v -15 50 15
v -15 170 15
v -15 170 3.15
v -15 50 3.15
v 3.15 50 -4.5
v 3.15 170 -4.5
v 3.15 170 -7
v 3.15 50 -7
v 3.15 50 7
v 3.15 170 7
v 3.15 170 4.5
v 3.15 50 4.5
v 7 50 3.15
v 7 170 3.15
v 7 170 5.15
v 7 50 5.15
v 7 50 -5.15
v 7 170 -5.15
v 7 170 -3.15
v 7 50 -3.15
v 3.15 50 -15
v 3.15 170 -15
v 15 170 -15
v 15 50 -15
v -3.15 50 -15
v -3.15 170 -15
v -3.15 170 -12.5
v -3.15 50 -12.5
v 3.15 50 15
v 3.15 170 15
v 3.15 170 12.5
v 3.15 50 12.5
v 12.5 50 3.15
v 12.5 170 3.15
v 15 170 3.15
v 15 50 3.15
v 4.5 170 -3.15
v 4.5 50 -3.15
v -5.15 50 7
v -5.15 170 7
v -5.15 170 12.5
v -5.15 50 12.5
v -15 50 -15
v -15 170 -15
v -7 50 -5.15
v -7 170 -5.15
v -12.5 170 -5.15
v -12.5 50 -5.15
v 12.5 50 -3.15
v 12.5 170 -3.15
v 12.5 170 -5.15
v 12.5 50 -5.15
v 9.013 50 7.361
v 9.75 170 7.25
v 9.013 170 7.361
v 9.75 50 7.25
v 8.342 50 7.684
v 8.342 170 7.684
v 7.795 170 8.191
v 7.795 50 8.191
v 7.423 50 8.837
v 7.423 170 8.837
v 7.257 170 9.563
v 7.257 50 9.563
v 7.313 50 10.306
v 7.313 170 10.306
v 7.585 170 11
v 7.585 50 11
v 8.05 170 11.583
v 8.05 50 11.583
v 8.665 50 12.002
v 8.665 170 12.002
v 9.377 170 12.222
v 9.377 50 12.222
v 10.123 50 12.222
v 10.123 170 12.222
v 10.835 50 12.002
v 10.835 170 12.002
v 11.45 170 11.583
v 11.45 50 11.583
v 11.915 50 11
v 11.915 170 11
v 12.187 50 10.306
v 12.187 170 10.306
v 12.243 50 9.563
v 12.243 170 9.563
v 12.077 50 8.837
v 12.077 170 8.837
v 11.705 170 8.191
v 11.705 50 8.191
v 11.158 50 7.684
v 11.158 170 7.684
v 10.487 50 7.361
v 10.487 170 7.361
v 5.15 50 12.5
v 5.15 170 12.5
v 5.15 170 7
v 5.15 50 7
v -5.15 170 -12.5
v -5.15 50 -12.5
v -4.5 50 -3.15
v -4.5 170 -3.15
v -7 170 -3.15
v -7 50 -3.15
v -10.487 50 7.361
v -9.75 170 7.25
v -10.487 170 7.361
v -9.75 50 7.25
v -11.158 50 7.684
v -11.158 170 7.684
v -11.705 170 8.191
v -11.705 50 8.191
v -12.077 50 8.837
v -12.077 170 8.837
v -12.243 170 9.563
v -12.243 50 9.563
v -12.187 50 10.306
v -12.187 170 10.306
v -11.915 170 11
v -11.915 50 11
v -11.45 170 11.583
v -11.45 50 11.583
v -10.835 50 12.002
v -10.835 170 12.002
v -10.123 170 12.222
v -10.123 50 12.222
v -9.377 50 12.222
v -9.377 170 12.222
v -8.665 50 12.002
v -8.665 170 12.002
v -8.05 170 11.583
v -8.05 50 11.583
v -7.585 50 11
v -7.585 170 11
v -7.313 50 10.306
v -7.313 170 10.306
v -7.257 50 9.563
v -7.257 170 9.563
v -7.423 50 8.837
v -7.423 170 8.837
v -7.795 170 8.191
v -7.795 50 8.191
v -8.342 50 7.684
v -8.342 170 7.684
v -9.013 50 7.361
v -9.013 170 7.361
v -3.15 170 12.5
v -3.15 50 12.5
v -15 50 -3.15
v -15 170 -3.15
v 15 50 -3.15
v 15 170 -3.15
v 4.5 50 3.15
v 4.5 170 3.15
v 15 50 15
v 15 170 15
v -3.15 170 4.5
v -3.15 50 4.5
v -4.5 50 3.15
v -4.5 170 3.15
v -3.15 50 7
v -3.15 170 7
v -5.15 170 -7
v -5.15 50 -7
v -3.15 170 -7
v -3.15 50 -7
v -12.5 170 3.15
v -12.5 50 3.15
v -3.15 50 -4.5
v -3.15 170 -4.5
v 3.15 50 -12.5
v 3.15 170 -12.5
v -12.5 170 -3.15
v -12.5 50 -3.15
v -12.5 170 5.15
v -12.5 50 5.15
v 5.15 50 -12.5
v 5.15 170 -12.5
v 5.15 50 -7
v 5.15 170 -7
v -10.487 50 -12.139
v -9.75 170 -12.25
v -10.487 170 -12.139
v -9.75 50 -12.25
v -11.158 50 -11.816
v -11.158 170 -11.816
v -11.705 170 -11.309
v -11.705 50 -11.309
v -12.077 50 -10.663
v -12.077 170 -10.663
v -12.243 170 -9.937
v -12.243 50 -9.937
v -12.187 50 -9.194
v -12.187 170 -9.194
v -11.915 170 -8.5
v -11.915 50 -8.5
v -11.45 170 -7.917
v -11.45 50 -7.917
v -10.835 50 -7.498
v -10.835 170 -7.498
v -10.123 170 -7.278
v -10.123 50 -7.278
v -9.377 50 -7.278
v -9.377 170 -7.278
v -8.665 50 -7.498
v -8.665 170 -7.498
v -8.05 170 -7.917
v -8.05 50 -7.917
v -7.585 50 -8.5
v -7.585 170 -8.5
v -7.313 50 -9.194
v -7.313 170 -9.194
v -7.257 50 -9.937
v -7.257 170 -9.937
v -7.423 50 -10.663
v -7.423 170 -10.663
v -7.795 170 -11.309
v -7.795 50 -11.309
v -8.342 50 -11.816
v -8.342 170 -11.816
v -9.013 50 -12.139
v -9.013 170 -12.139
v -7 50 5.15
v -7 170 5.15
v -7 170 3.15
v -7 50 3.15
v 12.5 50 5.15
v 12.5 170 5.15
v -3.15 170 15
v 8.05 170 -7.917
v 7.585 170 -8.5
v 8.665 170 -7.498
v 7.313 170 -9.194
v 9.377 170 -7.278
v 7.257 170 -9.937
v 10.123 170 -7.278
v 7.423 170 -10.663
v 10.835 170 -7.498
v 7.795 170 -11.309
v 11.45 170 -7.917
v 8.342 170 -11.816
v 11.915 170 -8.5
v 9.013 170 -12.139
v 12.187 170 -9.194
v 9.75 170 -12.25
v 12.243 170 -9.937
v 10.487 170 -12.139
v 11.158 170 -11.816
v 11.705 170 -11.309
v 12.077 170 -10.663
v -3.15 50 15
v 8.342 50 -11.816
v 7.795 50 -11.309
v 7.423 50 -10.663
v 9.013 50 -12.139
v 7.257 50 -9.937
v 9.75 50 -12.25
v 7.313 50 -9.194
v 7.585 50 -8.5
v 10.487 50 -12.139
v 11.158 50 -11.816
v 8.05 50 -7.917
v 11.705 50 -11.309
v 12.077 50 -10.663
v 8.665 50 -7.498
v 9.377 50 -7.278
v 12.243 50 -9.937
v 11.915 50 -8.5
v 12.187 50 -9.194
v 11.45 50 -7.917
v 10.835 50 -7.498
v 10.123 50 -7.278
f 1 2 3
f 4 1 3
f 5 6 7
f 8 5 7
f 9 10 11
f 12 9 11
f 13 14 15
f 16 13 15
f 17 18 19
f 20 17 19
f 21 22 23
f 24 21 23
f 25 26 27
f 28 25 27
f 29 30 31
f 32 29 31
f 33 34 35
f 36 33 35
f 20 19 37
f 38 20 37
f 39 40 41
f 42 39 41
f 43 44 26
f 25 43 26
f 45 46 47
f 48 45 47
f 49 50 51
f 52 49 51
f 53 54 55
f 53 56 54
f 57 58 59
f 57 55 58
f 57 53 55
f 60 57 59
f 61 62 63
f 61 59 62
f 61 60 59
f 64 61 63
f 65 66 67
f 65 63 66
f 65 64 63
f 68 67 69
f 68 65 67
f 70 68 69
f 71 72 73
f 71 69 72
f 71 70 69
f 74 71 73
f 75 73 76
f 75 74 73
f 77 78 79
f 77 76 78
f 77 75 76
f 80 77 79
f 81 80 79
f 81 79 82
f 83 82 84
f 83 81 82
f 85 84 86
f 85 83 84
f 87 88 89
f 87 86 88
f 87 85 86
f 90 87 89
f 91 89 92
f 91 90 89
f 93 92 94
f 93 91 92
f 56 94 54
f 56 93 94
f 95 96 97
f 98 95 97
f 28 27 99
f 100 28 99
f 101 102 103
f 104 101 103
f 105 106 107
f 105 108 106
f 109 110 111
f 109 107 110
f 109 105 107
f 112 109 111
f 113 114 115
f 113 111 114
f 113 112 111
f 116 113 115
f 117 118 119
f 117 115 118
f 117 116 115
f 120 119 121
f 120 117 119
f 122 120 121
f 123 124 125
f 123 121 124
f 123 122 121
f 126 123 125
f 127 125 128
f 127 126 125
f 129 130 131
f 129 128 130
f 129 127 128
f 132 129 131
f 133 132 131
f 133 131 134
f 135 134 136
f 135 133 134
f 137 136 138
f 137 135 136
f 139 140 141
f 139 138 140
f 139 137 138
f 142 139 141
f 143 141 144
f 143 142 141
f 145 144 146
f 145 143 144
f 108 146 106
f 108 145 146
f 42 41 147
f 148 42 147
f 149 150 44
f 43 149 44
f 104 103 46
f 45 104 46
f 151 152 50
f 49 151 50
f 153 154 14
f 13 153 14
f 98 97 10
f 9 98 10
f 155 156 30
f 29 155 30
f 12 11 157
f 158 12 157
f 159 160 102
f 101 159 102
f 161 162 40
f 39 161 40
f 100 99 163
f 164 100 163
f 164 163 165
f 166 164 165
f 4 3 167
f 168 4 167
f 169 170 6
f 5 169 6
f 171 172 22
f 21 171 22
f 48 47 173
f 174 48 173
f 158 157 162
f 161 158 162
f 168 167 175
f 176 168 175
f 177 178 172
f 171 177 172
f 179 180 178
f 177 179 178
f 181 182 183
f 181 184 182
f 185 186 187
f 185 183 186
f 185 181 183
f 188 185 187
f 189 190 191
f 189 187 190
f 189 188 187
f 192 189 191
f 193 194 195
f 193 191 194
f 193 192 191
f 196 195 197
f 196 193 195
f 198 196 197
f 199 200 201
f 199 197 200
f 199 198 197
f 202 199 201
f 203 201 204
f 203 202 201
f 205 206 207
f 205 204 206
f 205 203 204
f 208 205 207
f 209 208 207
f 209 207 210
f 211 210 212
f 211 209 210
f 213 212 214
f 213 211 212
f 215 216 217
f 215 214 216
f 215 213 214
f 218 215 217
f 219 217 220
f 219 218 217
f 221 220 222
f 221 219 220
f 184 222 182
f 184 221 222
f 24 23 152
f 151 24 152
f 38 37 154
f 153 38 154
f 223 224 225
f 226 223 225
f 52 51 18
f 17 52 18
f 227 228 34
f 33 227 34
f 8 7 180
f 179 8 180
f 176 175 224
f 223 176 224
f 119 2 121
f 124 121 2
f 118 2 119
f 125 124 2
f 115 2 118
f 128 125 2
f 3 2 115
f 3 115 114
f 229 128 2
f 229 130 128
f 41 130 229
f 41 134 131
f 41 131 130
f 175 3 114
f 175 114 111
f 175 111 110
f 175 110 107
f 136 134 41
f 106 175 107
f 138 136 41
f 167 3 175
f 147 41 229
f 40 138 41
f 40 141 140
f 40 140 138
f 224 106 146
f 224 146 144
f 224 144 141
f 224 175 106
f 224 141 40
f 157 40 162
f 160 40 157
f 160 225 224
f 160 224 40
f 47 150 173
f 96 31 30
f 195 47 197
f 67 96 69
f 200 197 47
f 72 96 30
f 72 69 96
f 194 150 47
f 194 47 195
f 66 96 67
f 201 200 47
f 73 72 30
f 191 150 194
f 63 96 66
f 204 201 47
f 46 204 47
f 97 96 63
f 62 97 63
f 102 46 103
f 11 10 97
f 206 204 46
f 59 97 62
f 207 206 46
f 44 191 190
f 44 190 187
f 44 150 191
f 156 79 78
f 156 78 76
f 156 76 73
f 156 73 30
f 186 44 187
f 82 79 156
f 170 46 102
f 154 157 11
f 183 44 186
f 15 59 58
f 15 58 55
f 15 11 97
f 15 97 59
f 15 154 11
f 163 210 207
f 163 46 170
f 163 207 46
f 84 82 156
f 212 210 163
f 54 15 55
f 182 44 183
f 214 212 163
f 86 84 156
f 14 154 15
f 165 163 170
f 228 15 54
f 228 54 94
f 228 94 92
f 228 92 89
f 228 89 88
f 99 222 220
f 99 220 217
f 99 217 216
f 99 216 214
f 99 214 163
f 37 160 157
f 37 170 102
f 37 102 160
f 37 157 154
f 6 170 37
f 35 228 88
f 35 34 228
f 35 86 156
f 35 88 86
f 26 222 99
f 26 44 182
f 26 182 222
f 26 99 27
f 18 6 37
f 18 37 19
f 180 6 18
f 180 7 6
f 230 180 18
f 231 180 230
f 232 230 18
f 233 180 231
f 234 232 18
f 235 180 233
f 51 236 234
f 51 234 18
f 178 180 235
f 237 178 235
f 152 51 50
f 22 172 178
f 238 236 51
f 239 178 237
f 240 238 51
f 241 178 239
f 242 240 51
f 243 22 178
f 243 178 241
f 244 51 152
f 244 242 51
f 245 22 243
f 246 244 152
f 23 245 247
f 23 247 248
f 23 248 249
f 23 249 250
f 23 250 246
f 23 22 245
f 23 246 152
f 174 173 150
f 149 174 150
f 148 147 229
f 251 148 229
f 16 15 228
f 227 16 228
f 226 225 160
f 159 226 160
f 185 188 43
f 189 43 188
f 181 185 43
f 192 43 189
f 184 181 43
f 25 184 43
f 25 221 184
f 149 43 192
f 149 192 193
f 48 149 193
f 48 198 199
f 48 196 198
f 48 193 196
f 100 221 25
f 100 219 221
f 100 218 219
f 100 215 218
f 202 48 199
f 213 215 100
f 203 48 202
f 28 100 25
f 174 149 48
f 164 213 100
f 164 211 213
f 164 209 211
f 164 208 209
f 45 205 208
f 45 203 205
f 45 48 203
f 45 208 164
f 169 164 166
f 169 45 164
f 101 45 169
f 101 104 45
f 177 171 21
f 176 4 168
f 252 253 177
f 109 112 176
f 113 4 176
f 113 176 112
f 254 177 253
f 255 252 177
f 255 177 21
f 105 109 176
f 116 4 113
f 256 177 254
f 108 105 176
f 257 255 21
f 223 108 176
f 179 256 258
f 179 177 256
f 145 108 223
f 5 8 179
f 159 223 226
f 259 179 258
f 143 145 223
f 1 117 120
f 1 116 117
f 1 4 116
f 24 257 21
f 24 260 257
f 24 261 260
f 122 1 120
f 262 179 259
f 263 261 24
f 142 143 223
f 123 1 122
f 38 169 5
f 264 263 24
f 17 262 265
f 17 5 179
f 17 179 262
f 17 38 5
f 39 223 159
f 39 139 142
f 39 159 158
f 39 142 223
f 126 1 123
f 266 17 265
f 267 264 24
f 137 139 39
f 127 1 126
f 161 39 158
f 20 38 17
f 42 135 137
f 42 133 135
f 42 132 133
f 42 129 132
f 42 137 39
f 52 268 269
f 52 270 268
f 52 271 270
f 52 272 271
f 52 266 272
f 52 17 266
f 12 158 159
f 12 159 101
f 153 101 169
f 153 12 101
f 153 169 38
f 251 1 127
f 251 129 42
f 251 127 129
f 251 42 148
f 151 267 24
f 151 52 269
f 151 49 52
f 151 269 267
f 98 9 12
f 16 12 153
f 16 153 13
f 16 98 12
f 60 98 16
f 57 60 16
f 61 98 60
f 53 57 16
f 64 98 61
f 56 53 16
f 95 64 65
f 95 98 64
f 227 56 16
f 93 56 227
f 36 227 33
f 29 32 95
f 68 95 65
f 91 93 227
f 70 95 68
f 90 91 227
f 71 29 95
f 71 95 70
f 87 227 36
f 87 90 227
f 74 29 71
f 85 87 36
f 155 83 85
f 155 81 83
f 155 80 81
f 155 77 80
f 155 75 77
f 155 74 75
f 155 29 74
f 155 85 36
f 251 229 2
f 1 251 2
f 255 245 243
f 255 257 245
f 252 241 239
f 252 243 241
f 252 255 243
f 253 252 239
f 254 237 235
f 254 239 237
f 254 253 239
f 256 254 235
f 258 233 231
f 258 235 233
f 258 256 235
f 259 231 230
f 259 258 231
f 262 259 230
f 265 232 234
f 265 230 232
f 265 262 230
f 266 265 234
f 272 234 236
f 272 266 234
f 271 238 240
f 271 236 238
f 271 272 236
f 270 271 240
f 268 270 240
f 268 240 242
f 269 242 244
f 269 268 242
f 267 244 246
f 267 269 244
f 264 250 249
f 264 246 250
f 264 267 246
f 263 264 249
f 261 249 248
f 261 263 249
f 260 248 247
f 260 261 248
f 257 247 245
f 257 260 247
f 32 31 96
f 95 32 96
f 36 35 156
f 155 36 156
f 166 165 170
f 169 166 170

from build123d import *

# Parameters (mm, degrees)
SKETCH_1_R          = 2.5
EXTRUDE_1_DEPTH     = 180
SKETCH_2_R          = 82.250528809
CUT_EXTRUDE_1_DEPTH = 10
SKETCH_3_R          = 47.359827943
CUT_EXTRUDE_2_DEPTH = 200
SKETCH_4_R          = 50.055938799
CUT_EXTRUDE_3_DEPTH = 30


with BuildPart() as part:
    # 草图1 → 凸台-拉伸1 (new, symmetric)
    with BuildSketch(Plane(origin=(0, 0, 0), x_dir=(1, 0, 0), z_dir=(0, 1, 0))):
        Polygon((-15, -3.15), (-12.5, -3.15), (-12.5, -5.15), (-7, -5.15), (-7, -3.15), (-4.5, -3.15), (-4.5, 3.15), (-7, 3.15), (-7, 5.15), (-12.5, 5.15), (-12.5, 3.15), (-15, 3.15), (-15, 15), (-3.15, 15), (-3.15, 12.5), (-5.15, 12.5), (-5.15, 7), (-3.15, 7), (-3.15, 4.5), (3.15, 4.5), (3.15, 7), (5.15, 7), (5.15, 12.5), (3.15, 12.5), (3.15, 15), (15, 15), (15, 3.15), (12.5, 3.15), (12.5, 5.15), (7, 5.15), (7, 3.15), (4.5, 3.15), (4.5, -3.15), (7, -3.15), (7, -5.15), (12.5, -5.15), (12.5, -3.15), (15, -3.15), (15, -15), (3.15, -15), (3.15, -12.5), (5.15, -12.5), (5.15, -7), (3.15, -7), (3.15, -4.5), (-3.15, -4.5), (-3.15, -7), (-5.15, -7), (-5.15, -12.5), (-3.15, -12.5), (-3.15, -15), (-15, -15), align=None)
        with Locations(Location((-9.75, -9.75, 0), (0, 0, 90))):
            Circle(SKETCH_1_R, mode=Mode.SUBTRACT)
        with Locations(Location((-9.75, 9.75, 0), (0, 0, 90))):
            Circle(SKETCH_1_R, mode=Mode.SUBTRACT)
        with Locations(Location((9.75, 9.75, 0), (0, 0, 90))):
            Circle(SKETCH_1_R, mode=Mode.SUBTRACT)
        with Locations(Location((9.75, -9.75, 0), (0, 0, 90))):
            Circle(SKETCH_1_R, mode=Mode.SUBTRACT)
    extrude(amount=EXTRUDE_1_DEPTH, both=True)

    # 草图2 → 切除-拉伸1 (cut)
    with BuildSketch(Plane(origin=(0, 180, 0), x_dir=(1, 0, 0), z_dir=(0, 1, 0))):
        Circle(SKETCH_2_R)
    extrude(amount=-CUT_EXTRUDE_1_DEPTH, mode=Mode.SUBTRACT)

    # 草图3 → 切除-拉伸2 (cut)
    with BuildSketch(Plane.XZ.offset(180)):
        with Locations((0.216432031, -1.772037256)):
            Circle(SKETCH_3_R)
    extrude(amount=-CUT_EXTRUDE_2_DEPTH, mode=Mode.SUBTRACT)

    # 草图4 → 切除-拉伸3 (cut)
    with BuildSketch(Plane.XZ.offset(-20)):
        with Locations((-1.287426062, -1.543634952)):
            Circle(SKETCH_4_R)
    extrude(amount=-CUT_EXTRUDE_3_DEPTH, mode=Mode.SUBTRACT)


solid = part.part
